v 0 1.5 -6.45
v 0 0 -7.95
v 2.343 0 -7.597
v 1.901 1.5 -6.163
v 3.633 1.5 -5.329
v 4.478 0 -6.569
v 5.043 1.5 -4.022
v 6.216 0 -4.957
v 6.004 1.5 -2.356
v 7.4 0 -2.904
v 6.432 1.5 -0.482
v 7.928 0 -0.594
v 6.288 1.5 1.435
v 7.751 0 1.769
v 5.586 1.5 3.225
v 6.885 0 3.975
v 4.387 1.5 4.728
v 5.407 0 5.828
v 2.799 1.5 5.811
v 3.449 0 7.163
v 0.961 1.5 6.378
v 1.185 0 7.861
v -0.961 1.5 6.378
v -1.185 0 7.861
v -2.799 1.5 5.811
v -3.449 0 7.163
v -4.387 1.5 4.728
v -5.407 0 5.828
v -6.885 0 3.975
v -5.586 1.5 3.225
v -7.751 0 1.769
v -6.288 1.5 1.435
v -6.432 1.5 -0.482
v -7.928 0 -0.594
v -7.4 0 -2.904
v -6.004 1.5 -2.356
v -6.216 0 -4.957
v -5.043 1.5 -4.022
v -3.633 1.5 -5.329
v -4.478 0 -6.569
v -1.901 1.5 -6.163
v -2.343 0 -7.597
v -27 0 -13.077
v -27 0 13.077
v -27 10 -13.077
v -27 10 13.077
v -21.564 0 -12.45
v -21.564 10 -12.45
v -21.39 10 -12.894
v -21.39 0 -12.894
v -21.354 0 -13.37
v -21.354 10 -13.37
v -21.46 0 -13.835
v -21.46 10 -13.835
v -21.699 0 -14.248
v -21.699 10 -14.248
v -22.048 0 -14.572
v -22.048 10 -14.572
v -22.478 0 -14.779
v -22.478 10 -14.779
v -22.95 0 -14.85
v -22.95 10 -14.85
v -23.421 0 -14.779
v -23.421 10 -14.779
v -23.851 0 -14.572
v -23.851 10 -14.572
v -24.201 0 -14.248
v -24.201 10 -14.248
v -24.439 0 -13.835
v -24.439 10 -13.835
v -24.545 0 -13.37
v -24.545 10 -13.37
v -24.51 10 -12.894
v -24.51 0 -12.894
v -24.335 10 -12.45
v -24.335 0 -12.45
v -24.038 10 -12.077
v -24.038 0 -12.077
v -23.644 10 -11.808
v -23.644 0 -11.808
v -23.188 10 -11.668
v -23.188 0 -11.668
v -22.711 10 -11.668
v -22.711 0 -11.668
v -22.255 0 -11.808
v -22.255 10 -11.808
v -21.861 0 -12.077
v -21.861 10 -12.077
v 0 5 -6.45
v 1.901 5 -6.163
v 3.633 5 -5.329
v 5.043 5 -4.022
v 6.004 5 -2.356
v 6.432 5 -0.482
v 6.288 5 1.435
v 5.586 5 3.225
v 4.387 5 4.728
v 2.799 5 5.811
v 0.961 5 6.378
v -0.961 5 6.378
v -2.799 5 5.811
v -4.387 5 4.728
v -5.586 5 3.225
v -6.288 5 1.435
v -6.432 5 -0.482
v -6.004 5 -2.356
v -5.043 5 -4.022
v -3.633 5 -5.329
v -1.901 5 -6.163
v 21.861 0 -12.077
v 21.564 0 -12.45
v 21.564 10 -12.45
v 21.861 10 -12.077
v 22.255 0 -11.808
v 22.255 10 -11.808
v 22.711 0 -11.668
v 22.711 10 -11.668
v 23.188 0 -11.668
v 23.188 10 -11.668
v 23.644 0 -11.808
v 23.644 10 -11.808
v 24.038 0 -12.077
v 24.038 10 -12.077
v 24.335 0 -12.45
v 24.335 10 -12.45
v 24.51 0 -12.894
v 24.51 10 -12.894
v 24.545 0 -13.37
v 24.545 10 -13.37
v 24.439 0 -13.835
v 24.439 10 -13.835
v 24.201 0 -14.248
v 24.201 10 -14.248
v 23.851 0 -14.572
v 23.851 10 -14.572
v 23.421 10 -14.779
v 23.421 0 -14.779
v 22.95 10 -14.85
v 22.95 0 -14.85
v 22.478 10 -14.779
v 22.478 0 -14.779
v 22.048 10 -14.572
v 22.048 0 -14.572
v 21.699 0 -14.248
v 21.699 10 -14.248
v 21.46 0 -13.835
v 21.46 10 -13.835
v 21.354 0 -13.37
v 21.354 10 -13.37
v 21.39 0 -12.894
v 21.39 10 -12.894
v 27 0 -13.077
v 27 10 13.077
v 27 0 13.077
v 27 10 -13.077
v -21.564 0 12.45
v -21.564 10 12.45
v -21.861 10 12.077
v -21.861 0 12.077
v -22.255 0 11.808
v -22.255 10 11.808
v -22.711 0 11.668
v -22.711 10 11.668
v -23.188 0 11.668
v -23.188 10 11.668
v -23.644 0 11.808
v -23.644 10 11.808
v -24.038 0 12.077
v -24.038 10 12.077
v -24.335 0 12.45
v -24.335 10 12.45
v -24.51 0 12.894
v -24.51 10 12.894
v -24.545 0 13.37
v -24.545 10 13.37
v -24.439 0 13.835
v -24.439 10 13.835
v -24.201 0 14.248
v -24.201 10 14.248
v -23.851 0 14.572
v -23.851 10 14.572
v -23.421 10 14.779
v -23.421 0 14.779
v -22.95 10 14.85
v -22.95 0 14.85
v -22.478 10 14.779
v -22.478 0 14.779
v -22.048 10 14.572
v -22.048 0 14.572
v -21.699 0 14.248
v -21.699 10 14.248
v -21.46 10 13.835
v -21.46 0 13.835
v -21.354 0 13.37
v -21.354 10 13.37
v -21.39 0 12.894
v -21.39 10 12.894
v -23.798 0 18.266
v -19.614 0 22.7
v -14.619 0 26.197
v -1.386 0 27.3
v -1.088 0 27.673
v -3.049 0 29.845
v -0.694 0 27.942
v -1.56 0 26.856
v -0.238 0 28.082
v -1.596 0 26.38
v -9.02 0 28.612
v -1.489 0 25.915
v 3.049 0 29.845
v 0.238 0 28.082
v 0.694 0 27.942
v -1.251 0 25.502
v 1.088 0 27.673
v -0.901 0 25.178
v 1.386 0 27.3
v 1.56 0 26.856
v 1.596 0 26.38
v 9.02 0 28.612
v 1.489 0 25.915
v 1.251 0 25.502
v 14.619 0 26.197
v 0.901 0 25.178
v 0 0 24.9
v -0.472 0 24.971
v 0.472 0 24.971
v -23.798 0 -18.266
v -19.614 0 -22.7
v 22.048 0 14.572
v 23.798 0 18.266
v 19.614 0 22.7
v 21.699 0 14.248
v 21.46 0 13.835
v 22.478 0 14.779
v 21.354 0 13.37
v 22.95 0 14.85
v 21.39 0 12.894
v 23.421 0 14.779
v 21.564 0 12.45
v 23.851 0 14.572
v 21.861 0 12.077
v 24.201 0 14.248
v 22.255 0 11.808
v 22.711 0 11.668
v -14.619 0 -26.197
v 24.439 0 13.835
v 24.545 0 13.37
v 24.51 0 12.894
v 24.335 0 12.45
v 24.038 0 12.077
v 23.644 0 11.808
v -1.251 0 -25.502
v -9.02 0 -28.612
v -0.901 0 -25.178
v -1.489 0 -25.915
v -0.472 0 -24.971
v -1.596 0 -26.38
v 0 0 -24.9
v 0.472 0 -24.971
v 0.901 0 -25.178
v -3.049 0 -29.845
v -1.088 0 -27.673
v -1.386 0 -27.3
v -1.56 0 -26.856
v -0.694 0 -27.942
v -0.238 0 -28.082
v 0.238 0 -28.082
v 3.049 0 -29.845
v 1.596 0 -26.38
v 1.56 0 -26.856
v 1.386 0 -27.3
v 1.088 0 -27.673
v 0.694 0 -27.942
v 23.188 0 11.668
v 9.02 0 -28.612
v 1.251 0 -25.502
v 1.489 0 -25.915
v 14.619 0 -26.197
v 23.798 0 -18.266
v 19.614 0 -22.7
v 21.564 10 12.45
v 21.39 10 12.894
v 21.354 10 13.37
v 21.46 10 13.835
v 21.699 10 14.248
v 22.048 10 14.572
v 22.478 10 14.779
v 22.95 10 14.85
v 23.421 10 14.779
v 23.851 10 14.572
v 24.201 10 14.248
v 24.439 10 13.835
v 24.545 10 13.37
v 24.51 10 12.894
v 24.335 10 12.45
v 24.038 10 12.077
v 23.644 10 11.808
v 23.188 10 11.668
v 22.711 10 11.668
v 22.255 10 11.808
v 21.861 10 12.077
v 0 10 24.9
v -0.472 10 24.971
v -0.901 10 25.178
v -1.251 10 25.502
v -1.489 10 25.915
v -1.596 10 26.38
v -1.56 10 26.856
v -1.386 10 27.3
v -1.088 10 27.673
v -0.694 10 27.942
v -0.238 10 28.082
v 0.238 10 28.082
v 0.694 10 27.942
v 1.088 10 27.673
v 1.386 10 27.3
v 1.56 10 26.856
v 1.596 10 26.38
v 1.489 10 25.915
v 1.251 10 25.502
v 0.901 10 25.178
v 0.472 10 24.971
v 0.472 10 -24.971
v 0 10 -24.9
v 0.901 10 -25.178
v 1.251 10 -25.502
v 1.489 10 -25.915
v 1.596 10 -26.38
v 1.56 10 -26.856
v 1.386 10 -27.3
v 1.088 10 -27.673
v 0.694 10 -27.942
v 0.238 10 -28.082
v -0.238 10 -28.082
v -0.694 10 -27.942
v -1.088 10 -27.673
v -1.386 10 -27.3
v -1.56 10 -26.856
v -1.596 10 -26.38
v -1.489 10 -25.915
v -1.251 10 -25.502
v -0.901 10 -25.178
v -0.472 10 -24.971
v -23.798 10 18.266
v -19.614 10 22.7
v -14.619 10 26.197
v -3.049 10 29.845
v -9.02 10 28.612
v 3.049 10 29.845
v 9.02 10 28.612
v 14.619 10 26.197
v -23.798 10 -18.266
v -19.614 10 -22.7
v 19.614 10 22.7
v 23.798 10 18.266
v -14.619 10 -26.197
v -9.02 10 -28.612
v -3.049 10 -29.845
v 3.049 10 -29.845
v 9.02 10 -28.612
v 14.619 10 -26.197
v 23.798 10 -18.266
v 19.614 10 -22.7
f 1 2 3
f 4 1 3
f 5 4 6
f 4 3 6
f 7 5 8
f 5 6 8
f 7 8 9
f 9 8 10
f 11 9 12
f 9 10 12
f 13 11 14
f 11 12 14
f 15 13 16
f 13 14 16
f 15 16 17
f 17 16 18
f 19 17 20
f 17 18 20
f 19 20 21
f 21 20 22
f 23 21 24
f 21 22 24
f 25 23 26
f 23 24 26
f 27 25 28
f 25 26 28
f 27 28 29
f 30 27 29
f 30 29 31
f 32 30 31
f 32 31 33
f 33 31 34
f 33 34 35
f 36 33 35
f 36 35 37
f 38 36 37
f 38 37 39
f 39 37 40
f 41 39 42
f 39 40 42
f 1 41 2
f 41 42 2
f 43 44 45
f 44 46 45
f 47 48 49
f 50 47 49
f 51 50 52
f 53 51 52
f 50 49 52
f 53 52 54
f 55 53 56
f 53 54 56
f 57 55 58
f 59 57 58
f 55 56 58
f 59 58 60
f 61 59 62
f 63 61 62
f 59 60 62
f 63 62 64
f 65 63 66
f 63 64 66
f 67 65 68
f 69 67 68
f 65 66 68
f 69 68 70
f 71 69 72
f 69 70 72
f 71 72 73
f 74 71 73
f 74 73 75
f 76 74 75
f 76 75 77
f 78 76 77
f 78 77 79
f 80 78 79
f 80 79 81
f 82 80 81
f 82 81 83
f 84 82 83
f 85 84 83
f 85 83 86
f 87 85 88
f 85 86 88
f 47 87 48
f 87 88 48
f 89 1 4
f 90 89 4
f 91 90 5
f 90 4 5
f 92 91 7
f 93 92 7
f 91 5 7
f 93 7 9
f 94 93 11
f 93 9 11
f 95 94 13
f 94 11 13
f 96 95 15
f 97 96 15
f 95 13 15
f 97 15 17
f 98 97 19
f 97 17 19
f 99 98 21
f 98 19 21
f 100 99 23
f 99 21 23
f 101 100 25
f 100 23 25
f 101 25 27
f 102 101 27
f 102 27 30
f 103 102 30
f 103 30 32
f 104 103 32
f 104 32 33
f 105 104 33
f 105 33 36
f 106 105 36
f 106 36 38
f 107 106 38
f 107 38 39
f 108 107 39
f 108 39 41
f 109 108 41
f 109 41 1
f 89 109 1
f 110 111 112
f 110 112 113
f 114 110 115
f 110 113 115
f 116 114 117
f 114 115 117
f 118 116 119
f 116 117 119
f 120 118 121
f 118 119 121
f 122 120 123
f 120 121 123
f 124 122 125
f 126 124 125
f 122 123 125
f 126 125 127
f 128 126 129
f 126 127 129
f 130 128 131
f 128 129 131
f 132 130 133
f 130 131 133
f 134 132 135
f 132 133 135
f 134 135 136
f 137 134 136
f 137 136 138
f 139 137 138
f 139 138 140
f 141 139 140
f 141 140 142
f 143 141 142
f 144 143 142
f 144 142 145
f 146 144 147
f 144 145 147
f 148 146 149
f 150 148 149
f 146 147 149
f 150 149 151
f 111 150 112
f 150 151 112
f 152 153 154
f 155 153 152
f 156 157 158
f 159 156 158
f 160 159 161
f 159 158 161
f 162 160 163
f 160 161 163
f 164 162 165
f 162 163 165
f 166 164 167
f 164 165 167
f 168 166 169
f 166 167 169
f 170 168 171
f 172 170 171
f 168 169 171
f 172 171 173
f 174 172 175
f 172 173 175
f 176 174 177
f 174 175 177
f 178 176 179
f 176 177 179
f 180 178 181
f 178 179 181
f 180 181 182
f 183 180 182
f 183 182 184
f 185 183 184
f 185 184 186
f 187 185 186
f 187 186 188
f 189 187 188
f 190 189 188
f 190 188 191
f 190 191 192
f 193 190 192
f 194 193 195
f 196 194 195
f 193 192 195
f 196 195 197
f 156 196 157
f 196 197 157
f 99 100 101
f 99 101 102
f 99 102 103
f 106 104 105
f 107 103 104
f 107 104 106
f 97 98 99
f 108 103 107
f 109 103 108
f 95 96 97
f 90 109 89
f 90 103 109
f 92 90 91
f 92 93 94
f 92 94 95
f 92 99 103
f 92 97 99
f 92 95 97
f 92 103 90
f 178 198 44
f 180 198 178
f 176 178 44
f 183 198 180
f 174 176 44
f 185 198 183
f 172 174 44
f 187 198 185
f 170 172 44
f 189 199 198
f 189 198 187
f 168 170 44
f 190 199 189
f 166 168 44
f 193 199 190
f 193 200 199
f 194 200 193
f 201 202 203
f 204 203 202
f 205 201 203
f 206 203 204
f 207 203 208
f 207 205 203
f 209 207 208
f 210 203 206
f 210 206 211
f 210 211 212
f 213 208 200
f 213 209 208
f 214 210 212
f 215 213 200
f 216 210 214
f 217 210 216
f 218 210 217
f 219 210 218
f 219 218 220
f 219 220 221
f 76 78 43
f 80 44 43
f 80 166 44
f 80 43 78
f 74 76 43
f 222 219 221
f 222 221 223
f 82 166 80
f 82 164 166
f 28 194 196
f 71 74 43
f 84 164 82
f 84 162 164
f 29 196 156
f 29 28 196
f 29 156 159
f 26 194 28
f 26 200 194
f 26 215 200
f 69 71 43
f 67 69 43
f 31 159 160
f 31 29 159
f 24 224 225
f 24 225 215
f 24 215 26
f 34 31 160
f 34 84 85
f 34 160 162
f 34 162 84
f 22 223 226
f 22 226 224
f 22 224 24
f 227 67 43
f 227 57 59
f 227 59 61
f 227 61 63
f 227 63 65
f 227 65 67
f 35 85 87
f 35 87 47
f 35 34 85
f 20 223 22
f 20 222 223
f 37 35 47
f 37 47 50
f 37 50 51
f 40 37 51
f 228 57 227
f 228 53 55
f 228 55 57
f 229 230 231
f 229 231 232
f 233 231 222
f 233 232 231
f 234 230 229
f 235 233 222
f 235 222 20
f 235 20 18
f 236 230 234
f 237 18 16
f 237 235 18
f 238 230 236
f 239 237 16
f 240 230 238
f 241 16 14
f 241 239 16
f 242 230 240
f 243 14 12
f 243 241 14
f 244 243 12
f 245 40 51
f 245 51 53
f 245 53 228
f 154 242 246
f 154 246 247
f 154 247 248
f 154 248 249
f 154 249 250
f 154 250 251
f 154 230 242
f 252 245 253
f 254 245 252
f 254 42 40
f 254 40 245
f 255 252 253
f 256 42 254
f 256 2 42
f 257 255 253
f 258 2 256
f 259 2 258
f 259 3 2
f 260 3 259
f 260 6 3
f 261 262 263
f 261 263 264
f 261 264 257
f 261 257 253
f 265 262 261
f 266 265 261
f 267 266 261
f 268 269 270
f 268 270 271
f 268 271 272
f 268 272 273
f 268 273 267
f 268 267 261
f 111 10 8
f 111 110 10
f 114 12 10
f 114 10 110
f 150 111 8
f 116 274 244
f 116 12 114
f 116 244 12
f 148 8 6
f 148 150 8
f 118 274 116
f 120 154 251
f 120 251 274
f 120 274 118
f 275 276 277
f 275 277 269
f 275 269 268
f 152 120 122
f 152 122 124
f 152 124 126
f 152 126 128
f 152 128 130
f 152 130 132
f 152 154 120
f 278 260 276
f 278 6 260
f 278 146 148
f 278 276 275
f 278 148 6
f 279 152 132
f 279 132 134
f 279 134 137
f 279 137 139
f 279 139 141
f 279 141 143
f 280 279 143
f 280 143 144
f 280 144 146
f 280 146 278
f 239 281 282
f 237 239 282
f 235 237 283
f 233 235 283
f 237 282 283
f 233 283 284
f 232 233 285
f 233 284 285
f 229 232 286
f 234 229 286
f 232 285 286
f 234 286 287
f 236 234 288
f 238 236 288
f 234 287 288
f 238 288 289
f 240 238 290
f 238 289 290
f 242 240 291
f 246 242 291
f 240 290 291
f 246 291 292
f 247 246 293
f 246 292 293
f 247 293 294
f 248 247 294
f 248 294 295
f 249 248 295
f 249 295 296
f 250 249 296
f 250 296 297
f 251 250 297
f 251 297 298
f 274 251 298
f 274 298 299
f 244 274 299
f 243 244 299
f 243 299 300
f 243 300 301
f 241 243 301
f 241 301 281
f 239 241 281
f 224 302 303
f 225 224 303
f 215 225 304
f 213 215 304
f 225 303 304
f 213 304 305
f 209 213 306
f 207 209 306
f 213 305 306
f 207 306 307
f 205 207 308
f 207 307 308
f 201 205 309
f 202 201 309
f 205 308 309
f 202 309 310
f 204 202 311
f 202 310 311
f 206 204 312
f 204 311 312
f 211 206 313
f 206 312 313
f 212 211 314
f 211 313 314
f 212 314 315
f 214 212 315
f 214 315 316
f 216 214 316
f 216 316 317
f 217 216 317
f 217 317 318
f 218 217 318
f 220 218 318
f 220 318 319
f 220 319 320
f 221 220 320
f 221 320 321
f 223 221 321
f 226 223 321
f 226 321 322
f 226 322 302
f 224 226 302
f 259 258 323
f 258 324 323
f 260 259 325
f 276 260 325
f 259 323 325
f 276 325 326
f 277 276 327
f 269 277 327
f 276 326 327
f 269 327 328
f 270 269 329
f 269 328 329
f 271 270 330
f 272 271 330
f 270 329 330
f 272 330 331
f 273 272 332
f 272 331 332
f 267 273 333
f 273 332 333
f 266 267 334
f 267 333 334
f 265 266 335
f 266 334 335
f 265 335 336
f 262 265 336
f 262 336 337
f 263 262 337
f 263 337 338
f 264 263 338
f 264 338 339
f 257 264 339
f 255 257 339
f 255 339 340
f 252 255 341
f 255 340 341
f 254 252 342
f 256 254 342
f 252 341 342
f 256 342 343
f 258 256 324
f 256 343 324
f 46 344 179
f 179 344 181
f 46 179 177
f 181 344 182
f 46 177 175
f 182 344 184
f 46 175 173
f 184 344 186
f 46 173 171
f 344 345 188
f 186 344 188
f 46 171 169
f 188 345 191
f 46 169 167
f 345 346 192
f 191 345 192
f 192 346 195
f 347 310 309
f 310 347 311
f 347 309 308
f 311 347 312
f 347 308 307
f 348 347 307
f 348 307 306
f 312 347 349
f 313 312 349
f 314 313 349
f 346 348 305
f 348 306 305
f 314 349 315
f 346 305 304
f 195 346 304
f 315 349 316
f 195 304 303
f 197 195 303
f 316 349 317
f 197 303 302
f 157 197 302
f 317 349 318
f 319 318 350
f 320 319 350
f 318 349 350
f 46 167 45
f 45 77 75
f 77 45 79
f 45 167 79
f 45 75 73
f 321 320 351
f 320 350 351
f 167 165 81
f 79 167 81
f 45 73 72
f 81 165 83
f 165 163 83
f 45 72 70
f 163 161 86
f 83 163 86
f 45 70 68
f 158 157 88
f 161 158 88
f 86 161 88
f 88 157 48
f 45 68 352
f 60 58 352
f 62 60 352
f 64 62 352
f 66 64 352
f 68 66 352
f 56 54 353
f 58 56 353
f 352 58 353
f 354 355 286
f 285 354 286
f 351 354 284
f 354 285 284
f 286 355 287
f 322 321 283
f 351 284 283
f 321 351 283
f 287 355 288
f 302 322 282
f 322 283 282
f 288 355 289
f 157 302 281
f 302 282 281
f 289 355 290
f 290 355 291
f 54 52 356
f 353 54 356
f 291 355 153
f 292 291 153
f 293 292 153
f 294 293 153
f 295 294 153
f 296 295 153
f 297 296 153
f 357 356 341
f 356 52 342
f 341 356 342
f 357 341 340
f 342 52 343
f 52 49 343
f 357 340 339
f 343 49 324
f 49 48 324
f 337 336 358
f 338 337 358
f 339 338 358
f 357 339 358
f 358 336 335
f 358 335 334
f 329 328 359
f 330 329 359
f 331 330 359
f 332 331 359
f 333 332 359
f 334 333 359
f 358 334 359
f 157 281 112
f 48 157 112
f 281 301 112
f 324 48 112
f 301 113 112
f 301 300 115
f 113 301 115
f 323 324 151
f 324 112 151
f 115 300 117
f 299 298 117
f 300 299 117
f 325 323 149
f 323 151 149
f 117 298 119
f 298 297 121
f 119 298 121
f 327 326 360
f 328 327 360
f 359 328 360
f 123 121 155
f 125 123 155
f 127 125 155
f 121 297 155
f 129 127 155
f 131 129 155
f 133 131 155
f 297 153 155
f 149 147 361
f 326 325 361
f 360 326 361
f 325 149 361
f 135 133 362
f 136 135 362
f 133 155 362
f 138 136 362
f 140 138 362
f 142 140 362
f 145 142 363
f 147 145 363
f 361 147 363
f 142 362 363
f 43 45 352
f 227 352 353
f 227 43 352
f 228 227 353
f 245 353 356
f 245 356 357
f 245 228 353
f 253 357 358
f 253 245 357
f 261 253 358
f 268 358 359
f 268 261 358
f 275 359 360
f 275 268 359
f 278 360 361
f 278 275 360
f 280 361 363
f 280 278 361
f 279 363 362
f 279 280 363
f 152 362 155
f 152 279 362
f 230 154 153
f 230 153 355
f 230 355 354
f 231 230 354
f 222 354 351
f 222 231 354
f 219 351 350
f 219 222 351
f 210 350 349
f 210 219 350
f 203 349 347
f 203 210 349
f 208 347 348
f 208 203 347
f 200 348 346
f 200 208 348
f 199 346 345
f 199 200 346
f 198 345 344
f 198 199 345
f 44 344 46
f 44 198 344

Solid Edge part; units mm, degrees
sketch "Sketch1" plane through (0, 0, 0) normal (0, -1, 0) x (1, 0, 0)
  circle A0 centre (0, 0) radius 30
extrude "Protrusion1" add sketch "Sketch1" against normal blind 10
sketch "Sketch2" plane through (0, 10, 0) normal (0, 1, 0) x (0, 0, 1)
  circle A0 centre (-26.5, 0) radius 1.6
  dimension "D1" = 26.5
extrude "Cutout1" cut sketch "Sketch2" against normal up to next
pattern_circular "Pattern1" count 6 over 360 about axis through (0, 10, 0) along (0, -1, 0) of "Cutout1"
sketch "Sketch3" plane through (0, 10, 0) normal (0, 1, 0) x (0, 0, 1)
  line L0 (-27.1295, -30) -> (30.6259, -30)
  line L1 (30.6259, -30) -> (30.6259, -27)
  line L2 (30.6259, -27) -> (-27.1295, -27)
  line L3 (-27.1295, -27) -> (-27.1295, -30)
  line L4 (-24.9621, 30) -> (24.2465, 30)
  line L5 (24.2465, 30) -> (24.2465, 27)
  line L6 (24.2465, 27) -> (-24.9621, 27)
  line L7 (-24.9621, 27) -> (-24.9621, 30)
  dimension "D1" = 3
  dimension "D2" = 30
  dimension "D3" = 3
  dimension "D4" = 30
extrude "Cutout2" cut sketch "Sketch3" against normal up to next
sketch "Sketch4" plane through (0, 0, 0) normal (0, -1, 0) x (0, 0, -1)
  circle A0 centre (0, 0) radius 6.45
extrude "ExtrudedCutout_3" cut sketch "Sketch4" against normal blind 5
chamfer "Chamfer_1" distance 1.5 angle 45 1 edges at (0, 0, 6.45)
